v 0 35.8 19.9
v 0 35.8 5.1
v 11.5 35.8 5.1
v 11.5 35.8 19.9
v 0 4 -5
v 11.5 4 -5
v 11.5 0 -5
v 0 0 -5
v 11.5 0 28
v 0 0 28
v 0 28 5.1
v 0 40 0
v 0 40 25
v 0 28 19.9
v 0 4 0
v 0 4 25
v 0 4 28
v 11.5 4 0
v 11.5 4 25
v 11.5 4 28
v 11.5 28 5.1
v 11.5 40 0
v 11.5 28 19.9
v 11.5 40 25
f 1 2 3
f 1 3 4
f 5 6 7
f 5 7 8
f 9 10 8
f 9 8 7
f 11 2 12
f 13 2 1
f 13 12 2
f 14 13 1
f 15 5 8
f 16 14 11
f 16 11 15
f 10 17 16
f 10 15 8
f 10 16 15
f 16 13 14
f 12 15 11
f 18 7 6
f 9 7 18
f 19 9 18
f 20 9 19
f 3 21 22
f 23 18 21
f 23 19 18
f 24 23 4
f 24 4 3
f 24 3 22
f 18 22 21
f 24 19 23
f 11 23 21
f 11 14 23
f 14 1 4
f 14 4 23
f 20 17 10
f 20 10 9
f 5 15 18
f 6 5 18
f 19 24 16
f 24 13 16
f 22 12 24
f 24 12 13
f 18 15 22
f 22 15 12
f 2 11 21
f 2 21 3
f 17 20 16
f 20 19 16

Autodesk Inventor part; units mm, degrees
ref_plane "YZ Plane" through (0, 0, 0) normal (1, 0, 0) x (0, 1, 0)
ref_plane "XZ Plane" through (0, 0, 0) normal (0, 1, 0) x (-1, 0, 0)
ref_plane "XY Plane" through (0, 0, 0) normal (0, 0, 1) x (1, 0, 0)
sketch "Sketch1" plane through (0, 0, 0) normal (1, 0, 0) x (0, 1, 0)
  line L0 (0, 0) -> (40, 0)
  line L1 (40, 0) -> (40, 25)
  line L2 (40, 25) -> (0, 25)
  line L3 (0, 25) -> (0, 0)
  line L4 (35.8, 19.9) -> (28, 19.9)
  line L5 (28, 19.9) -> (28, 5.1)
  line L6 (28, 5.1) -> (35.8, 5.1)
  line L7 (35.8, 5.1) -> (35.8, 19.9)
  dimension "d0" = 40
  dimension "d1" = 25
  dimension "d2" = 14.8
  dimension "d3" = 7.8
  dimension "d4" = 5.1
  dimension "d5" = 28
extrude "Extrusion1" add sketch "Sketch1" along normal blind 11.5
sketch "Sketch2" plane through (0, 0, 25) normal (0, 0, 1) x (1, 0, 0)
  line L0 (0, 0) -> (11.5, 0) projected
  line L1 (11.5, 40) -> (11.5, 0) projected
  line L2 (0, 0) -> (11.5, 0)
  line L3 (11.5, 0) -> (11.5, 4)
  line L4 (11.5, 4) -> (0, 4)
  line L5 (0, 4) -> (0, 0)
  dimension "d8" = 4
extrude "Extrusion2" add sketch "Sketch2" along normal blind 3
sketch "Sketch3" plane through (0, 0, 0) normal (0, 0, -1) x (-1, 0, 0)
  line L0 (0, 4) -> (-11.5, 4) projected
  line L1 (0, 4) -> (0, 0) projected
  line L2 (-11.5, 4) -> (0, 4)
  line L3 (0, 4) -> (0, 0)
  line L4 (0, 0) -> (-11.5, 0)
  line L5 (-11.5, 0) -> (-11.5, 4)
extrude "Extrusion3" add sketch "Sketch3" along normal blind 5
properties part number "SecondaryBracket"
